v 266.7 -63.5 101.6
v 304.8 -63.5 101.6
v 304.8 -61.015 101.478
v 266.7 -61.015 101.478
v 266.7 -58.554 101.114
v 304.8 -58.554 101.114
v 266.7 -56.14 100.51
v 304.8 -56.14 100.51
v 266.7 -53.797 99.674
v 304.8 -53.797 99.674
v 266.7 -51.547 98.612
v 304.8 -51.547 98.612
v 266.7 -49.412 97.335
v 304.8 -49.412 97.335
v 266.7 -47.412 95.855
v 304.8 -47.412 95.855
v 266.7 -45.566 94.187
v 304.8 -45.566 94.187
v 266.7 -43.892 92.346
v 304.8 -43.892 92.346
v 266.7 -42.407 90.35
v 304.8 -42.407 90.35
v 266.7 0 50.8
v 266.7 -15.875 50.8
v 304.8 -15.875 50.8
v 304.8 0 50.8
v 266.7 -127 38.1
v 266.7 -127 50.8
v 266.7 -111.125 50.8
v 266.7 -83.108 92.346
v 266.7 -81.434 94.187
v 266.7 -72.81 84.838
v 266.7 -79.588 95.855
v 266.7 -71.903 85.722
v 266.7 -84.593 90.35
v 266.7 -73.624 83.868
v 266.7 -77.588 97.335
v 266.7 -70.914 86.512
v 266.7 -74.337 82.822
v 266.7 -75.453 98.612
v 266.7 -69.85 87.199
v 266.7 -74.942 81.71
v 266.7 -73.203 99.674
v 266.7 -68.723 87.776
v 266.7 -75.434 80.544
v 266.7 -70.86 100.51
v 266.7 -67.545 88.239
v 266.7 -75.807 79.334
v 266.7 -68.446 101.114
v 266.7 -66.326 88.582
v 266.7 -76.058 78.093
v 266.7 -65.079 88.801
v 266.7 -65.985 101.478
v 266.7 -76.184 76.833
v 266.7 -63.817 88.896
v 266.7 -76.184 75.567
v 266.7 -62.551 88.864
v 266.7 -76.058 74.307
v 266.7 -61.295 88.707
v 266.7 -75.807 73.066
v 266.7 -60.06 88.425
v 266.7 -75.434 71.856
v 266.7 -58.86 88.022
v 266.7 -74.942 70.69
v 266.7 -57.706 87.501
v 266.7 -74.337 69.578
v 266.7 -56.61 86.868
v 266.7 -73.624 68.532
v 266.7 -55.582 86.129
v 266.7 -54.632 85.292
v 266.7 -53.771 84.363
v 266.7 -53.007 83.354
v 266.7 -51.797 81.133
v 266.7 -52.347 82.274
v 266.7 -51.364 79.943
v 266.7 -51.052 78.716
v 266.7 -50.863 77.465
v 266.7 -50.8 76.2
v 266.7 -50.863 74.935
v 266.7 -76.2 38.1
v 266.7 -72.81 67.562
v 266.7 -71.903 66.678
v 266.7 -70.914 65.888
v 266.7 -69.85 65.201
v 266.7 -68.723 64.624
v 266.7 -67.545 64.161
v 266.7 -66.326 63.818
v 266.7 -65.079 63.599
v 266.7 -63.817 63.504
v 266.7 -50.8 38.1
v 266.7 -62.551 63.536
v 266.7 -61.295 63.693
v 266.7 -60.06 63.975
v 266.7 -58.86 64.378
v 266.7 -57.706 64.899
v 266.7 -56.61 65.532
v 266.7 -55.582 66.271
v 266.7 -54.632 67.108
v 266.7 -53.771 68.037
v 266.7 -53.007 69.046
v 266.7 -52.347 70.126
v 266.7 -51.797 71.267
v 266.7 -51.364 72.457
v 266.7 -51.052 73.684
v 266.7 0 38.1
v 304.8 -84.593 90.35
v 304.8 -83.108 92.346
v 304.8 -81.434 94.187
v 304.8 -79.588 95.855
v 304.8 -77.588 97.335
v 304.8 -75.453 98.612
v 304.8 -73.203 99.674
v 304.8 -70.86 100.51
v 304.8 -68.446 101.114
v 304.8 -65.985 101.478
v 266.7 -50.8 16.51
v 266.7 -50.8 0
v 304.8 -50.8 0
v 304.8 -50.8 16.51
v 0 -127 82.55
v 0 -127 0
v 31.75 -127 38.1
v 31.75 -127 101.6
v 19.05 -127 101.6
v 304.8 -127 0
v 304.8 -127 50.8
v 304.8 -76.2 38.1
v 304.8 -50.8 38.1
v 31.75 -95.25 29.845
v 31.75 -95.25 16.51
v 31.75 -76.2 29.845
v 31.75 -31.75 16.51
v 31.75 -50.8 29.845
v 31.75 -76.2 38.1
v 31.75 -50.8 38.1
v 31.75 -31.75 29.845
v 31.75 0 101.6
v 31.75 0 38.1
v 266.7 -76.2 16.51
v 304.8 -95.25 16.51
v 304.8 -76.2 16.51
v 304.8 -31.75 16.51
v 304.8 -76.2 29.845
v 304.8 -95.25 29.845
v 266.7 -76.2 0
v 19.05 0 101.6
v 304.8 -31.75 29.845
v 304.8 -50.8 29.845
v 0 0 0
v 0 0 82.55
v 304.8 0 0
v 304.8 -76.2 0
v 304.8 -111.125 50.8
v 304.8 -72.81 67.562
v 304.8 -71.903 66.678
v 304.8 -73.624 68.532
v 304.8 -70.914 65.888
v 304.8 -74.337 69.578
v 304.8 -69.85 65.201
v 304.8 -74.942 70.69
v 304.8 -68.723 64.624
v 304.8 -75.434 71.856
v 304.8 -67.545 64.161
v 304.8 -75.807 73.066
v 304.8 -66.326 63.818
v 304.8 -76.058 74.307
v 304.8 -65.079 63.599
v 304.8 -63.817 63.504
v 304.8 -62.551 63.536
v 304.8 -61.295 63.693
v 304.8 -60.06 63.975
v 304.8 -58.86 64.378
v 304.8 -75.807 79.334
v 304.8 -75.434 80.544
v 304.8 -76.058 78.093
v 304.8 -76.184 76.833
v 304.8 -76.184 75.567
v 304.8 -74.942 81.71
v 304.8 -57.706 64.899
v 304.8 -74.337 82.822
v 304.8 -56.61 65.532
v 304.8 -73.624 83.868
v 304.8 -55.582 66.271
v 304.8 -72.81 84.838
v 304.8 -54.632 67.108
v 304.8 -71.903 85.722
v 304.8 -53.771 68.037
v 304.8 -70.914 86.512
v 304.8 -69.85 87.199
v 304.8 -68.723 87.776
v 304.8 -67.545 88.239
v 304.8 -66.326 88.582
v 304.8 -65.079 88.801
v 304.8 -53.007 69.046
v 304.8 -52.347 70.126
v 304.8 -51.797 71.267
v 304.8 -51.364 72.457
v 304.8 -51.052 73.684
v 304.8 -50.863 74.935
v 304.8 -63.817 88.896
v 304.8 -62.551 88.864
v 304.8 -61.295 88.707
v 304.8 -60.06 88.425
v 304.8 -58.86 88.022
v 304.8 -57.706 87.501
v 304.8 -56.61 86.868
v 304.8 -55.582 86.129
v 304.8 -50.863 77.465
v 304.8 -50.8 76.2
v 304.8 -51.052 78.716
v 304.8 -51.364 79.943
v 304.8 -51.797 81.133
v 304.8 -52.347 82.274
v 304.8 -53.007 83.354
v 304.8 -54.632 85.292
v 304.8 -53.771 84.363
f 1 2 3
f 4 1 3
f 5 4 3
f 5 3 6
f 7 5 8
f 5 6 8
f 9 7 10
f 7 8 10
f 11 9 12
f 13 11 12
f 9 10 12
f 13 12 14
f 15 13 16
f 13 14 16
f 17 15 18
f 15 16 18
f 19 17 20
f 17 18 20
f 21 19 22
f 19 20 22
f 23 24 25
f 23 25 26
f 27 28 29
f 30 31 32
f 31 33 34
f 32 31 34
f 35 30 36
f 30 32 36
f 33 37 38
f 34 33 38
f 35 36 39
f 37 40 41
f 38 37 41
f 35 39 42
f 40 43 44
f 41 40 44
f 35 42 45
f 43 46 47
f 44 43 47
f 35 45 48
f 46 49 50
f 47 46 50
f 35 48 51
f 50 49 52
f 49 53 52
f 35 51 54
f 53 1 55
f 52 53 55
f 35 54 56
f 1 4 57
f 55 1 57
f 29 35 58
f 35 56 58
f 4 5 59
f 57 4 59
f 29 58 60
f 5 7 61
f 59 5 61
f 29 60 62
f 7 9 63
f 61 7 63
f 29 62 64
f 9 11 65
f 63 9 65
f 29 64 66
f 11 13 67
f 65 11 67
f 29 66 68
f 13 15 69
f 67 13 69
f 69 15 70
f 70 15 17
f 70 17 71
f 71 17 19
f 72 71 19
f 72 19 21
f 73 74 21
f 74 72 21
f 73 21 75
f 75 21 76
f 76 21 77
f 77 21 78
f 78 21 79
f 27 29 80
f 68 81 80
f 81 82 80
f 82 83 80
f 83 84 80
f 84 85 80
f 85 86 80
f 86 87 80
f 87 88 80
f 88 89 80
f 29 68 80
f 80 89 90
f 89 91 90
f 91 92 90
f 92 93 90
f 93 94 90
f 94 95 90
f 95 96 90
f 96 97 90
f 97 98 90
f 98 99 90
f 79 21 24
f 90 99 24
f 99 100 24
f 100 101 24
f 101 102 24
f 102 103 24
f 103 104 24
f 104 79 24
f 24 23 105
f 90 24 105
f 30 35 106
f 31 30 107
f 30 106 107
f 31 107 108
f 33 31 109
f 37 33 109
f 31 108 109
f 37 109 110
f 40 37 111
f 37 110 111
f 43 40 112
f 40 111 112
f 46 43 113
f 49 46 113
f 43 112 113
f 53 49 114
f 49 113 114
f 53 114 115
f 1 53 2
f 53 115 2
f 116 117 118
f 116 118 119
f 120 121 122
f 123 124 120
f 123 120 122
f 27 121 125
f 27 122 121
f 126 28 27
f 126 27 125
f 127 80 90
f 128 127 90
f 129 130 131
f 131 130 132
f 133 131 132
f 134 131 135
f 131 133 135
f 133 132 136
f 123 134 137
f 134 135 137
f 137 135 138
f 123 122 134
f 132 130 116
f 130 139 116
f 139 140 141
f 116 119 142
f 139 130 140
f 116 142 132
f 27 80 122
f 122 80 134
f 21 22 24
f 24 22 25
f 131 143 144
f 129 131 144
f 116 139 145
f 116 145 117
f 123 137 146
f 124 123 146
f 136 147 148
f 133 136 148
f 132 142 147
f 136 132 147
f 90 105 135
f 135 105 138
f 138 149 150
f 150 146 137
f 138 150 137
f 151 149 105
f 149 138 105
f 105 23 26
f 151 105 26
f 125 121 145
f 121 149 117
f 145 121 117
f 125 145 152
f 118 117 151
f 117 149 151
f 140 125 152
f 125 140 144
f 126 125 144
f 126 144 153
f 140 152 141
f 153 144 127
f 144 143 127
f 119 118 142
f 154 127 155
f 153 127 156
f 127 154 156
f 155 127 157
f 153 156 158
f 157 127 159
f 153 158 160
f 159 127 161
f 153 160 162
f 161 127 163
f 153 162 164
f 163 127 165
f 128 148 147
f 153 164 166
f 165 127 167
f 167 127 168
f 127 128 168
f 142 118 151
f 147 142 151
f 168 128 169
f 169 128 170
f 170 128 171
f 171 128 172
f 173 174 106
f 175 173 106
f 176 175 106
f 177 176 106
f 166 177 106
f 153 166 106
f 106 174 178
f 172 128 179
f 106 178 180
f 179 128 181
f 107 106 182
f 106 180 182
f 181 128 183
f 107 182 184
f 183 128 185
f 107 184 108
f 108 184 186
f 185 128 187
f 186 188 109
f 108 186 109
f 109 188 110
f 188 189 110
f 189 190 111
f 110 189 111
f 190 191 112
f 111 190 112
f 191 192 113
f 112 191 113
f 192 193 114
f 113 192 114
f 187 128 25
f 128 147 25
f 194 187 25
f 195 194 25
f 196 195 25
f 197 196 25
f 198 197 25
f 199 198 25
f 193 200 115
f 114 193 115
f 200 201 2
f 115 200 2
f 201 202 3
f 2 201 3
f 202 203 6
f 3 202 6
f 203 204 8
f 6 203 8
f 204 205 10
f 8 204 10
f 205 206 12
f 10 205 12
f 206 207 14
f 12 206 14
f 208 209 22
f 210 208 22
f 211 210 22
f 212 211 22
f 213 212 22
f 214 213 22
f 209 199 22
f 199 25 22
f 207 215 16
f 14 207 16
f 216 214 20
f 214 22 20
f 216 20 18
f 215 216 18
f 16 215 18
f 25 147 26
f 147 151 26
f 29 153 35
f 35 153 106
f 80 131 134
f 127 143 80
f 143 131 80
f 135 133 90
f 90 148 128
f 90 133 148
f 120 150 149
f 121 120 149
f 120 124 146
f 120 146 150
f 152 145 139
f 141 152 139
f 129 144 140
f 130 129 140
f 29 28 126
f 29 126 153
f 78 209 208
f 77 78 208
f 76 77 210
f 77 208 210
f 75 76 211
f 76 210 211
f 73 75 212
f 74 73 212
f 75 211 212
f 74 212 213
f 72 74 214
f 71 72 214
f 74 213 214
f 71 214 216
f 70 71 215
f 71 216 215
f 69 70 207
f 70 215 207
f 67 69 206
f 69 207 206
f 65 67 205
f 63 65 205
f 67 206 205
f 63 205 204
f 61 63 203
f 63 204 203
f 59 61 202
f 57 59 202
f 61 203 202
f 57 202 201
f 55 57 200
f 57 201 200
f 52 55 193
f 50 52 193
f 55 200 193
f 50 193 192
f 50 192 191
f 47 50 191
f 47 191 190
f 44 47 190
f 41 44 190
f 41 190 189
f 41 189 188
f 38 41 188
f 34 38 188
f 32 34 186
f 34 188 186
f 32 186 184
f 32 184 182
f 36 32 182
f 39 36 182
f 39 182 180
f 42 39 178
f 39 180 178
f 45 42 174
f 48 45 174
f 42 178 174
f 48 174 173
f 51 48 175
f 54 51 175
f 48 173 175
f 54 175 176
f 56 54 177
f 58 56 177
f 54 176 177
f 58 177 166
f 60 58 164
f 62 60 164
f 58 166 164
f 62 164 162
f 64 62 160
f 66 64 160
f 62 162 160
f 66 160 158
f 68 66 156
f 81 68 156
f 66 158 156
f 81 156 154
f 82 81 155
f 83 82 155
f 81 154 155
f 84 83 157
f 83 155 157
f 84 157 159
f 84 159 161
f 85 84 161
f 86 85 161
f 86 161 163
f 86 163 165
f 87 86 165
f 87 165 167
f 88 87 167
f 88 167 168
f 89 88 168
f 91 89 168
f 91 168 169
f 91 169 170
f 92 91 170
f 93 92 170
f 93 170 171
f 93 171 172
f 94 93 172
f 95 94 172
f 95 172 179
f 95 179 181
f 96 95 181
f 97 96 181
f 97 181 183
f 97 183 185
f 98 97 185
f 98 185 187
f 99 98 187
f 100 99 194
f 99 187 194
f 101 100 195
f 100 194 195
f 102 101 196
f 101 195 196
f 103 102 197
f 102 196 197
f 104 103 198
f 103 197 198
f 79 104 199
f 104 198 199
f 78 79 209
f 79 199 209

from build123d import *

# Parameters (mm, degrees)
F0_W     = 38.1
F0_H     = 50.8
F1_DEPTH = 127
F2_W     = 25.4
F2_H     = 8.255
F3_DEPTH = 273.05
F5_DEPTH = 38.1
F4_R     = 12.7
F6_DEPTH = 38.1
F2_H_2   = 16.51
F7_DEPTH = 38.1


with BuildPart() as f1:
    # F0 (on Front) → F1 (new body)
    with BuildSketch(Plane.XZ):
        Polygon((0, 82.55), (0, 0), (304.8, 0), (304.8, 50.8), (266.7, 50.8), (266.7, 38.1), (31.75, 38.1), (31.75, 101.6), (19.05, 101.6), align=None)
        with Locations((285.75, 76.2)):
            Rectangle(F0_W, F0_H)
    extrude(amount=F1_DEPTH)

    # F2 (on face) → F3 (cut)
    with BuildSketch(Plane.YZ.offset(304.8)):
        with Locations((-63.5, 33.9725)):
            Rectangle(F2_W, F2_H)
        Polygon((-31.75, 29.845), (-50.8, 29.845), (-76.2, 29.845), (-95.25, 29.845), (-95.25, 16.51), (-76.2, 16.51), (-50.8, 16.51), (-31.75, 16.51), align=None)
    extrude(amount=-F3_DEPTH, mode=Mode.SUBTRACT)

    # F4 (on face) → F5 (cut, through all)
    with BuildSketch(Plane.YZ.offset(304.8)):
        with BuildLine():
            Line((0, 101.6), (-63.5, 101.6))
            ThreePointArc((-63.5, 101.6), (-51.547059, 98.611765), (-42.406574, 90.350173))
            Line((-42.406574, 90.350173), (-15.875, 50.8))
            Line((-15.875, 50.8), (0, 50.8))
            Line((0, 50.8), (0, 101.6))
        make_face()
        with BuildLine():
            Line((-127, 101.6), (-127, 50.8))
            Line((-127, 50.8), (-111.125, 50.8))
            Line((-111.125, 50.8), (-84.593426, 90.350173))
            ThreePointArc((-84.593426, 90.350173), (-75.452941, 98.611765), (-63.5, 101.6))
            Line((-63.5, 101.6), (-127, 101.6))
        make_face()
    extrude(amount=-F5_DEPTH, mode=Mode.SUBTRACT)

    # F4 (on face) → F6 (cut, through all)
    with BuildSketch(Plane.YZ.offset(304.8)):
        with Locations((-63.5, 76.2)):
            Circle(F4_R)
    extrude(amount=-F6_DEPTH, mode=Mode.SUBTRACT)

    # F2 (on face) → F7 (cut)
    with BuildSketch(Plane.YZ.offset(304.8)):
        with Locations((-63.5, 8.255)):
            Rectangle(F2_W, F2_H_2)
    extrude(amount=-F7_DEPTH, mode=Mode.SUBTRACT)


solid = f1.part
